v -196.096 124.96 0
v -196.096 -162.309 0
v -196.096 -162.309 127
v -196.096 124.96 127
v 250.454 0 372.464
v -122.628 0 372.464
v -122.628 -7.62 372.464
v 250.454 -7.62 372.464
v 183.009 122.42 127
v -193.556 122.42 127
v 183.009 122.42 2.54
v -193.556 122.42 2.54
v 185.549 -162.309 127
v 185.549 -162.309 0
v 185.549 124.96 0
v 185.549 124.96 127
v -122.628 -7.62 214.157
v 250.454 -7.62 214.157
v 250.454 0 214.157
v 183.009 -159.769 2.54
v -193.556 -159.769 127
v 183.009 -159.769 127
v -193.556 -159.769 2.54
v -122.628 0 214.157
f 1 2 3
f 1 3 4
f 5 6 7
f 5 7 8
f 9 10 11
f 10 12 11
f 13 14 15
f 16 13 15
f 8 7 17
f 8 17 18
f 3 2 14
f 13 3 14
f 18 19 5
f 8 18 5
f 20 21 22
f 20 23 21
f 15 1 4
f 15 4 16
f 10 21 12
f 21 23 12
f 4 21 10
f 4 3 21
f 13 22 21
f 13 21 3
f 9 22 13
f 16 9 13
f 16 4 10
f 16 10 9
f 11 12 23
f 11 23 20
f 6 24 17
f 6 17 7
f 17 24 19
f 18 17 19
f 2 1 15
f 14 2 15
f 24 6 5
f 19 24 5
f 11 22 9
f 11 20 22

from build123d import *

# Parameters (mm, degrees)
F0_W     = 381.645173
F0_H     = 287.268385
F1_DEPTH = 127
F2_T     = -2.54
F3_W     = 373.081997
F3_H     = 158.306822
F4_DEPTH = 7.62


with BuildPart() as f1:
    # F0 (on Top) → F1 (new body)
    with BuildSketch(Plane.XY):
        with Locations((-5.27358, -18.674351)):
            Rectangle(F0_W, F0_H)
    extrude(amount=F1_DEPTH)

    # F2
    f2_openings = [f1.faces().sort_by_distance(p)[0] for p in [
        (-5.273581, -18.674351, 127),
    ]]
    offset(amount=F2_T, openings=f2_openings)


with BuildPart() as f4:
    # F3 (on Front) → F4 (new body)
    with BuildSketch(Plane.XZ):
        with Locations((63.913486, 293.310799)):
            Rectangle(F3_W, F3_H)
    extrude(amount=F4_DEPTH)


solid = Compound([f1.part, f4.part])
